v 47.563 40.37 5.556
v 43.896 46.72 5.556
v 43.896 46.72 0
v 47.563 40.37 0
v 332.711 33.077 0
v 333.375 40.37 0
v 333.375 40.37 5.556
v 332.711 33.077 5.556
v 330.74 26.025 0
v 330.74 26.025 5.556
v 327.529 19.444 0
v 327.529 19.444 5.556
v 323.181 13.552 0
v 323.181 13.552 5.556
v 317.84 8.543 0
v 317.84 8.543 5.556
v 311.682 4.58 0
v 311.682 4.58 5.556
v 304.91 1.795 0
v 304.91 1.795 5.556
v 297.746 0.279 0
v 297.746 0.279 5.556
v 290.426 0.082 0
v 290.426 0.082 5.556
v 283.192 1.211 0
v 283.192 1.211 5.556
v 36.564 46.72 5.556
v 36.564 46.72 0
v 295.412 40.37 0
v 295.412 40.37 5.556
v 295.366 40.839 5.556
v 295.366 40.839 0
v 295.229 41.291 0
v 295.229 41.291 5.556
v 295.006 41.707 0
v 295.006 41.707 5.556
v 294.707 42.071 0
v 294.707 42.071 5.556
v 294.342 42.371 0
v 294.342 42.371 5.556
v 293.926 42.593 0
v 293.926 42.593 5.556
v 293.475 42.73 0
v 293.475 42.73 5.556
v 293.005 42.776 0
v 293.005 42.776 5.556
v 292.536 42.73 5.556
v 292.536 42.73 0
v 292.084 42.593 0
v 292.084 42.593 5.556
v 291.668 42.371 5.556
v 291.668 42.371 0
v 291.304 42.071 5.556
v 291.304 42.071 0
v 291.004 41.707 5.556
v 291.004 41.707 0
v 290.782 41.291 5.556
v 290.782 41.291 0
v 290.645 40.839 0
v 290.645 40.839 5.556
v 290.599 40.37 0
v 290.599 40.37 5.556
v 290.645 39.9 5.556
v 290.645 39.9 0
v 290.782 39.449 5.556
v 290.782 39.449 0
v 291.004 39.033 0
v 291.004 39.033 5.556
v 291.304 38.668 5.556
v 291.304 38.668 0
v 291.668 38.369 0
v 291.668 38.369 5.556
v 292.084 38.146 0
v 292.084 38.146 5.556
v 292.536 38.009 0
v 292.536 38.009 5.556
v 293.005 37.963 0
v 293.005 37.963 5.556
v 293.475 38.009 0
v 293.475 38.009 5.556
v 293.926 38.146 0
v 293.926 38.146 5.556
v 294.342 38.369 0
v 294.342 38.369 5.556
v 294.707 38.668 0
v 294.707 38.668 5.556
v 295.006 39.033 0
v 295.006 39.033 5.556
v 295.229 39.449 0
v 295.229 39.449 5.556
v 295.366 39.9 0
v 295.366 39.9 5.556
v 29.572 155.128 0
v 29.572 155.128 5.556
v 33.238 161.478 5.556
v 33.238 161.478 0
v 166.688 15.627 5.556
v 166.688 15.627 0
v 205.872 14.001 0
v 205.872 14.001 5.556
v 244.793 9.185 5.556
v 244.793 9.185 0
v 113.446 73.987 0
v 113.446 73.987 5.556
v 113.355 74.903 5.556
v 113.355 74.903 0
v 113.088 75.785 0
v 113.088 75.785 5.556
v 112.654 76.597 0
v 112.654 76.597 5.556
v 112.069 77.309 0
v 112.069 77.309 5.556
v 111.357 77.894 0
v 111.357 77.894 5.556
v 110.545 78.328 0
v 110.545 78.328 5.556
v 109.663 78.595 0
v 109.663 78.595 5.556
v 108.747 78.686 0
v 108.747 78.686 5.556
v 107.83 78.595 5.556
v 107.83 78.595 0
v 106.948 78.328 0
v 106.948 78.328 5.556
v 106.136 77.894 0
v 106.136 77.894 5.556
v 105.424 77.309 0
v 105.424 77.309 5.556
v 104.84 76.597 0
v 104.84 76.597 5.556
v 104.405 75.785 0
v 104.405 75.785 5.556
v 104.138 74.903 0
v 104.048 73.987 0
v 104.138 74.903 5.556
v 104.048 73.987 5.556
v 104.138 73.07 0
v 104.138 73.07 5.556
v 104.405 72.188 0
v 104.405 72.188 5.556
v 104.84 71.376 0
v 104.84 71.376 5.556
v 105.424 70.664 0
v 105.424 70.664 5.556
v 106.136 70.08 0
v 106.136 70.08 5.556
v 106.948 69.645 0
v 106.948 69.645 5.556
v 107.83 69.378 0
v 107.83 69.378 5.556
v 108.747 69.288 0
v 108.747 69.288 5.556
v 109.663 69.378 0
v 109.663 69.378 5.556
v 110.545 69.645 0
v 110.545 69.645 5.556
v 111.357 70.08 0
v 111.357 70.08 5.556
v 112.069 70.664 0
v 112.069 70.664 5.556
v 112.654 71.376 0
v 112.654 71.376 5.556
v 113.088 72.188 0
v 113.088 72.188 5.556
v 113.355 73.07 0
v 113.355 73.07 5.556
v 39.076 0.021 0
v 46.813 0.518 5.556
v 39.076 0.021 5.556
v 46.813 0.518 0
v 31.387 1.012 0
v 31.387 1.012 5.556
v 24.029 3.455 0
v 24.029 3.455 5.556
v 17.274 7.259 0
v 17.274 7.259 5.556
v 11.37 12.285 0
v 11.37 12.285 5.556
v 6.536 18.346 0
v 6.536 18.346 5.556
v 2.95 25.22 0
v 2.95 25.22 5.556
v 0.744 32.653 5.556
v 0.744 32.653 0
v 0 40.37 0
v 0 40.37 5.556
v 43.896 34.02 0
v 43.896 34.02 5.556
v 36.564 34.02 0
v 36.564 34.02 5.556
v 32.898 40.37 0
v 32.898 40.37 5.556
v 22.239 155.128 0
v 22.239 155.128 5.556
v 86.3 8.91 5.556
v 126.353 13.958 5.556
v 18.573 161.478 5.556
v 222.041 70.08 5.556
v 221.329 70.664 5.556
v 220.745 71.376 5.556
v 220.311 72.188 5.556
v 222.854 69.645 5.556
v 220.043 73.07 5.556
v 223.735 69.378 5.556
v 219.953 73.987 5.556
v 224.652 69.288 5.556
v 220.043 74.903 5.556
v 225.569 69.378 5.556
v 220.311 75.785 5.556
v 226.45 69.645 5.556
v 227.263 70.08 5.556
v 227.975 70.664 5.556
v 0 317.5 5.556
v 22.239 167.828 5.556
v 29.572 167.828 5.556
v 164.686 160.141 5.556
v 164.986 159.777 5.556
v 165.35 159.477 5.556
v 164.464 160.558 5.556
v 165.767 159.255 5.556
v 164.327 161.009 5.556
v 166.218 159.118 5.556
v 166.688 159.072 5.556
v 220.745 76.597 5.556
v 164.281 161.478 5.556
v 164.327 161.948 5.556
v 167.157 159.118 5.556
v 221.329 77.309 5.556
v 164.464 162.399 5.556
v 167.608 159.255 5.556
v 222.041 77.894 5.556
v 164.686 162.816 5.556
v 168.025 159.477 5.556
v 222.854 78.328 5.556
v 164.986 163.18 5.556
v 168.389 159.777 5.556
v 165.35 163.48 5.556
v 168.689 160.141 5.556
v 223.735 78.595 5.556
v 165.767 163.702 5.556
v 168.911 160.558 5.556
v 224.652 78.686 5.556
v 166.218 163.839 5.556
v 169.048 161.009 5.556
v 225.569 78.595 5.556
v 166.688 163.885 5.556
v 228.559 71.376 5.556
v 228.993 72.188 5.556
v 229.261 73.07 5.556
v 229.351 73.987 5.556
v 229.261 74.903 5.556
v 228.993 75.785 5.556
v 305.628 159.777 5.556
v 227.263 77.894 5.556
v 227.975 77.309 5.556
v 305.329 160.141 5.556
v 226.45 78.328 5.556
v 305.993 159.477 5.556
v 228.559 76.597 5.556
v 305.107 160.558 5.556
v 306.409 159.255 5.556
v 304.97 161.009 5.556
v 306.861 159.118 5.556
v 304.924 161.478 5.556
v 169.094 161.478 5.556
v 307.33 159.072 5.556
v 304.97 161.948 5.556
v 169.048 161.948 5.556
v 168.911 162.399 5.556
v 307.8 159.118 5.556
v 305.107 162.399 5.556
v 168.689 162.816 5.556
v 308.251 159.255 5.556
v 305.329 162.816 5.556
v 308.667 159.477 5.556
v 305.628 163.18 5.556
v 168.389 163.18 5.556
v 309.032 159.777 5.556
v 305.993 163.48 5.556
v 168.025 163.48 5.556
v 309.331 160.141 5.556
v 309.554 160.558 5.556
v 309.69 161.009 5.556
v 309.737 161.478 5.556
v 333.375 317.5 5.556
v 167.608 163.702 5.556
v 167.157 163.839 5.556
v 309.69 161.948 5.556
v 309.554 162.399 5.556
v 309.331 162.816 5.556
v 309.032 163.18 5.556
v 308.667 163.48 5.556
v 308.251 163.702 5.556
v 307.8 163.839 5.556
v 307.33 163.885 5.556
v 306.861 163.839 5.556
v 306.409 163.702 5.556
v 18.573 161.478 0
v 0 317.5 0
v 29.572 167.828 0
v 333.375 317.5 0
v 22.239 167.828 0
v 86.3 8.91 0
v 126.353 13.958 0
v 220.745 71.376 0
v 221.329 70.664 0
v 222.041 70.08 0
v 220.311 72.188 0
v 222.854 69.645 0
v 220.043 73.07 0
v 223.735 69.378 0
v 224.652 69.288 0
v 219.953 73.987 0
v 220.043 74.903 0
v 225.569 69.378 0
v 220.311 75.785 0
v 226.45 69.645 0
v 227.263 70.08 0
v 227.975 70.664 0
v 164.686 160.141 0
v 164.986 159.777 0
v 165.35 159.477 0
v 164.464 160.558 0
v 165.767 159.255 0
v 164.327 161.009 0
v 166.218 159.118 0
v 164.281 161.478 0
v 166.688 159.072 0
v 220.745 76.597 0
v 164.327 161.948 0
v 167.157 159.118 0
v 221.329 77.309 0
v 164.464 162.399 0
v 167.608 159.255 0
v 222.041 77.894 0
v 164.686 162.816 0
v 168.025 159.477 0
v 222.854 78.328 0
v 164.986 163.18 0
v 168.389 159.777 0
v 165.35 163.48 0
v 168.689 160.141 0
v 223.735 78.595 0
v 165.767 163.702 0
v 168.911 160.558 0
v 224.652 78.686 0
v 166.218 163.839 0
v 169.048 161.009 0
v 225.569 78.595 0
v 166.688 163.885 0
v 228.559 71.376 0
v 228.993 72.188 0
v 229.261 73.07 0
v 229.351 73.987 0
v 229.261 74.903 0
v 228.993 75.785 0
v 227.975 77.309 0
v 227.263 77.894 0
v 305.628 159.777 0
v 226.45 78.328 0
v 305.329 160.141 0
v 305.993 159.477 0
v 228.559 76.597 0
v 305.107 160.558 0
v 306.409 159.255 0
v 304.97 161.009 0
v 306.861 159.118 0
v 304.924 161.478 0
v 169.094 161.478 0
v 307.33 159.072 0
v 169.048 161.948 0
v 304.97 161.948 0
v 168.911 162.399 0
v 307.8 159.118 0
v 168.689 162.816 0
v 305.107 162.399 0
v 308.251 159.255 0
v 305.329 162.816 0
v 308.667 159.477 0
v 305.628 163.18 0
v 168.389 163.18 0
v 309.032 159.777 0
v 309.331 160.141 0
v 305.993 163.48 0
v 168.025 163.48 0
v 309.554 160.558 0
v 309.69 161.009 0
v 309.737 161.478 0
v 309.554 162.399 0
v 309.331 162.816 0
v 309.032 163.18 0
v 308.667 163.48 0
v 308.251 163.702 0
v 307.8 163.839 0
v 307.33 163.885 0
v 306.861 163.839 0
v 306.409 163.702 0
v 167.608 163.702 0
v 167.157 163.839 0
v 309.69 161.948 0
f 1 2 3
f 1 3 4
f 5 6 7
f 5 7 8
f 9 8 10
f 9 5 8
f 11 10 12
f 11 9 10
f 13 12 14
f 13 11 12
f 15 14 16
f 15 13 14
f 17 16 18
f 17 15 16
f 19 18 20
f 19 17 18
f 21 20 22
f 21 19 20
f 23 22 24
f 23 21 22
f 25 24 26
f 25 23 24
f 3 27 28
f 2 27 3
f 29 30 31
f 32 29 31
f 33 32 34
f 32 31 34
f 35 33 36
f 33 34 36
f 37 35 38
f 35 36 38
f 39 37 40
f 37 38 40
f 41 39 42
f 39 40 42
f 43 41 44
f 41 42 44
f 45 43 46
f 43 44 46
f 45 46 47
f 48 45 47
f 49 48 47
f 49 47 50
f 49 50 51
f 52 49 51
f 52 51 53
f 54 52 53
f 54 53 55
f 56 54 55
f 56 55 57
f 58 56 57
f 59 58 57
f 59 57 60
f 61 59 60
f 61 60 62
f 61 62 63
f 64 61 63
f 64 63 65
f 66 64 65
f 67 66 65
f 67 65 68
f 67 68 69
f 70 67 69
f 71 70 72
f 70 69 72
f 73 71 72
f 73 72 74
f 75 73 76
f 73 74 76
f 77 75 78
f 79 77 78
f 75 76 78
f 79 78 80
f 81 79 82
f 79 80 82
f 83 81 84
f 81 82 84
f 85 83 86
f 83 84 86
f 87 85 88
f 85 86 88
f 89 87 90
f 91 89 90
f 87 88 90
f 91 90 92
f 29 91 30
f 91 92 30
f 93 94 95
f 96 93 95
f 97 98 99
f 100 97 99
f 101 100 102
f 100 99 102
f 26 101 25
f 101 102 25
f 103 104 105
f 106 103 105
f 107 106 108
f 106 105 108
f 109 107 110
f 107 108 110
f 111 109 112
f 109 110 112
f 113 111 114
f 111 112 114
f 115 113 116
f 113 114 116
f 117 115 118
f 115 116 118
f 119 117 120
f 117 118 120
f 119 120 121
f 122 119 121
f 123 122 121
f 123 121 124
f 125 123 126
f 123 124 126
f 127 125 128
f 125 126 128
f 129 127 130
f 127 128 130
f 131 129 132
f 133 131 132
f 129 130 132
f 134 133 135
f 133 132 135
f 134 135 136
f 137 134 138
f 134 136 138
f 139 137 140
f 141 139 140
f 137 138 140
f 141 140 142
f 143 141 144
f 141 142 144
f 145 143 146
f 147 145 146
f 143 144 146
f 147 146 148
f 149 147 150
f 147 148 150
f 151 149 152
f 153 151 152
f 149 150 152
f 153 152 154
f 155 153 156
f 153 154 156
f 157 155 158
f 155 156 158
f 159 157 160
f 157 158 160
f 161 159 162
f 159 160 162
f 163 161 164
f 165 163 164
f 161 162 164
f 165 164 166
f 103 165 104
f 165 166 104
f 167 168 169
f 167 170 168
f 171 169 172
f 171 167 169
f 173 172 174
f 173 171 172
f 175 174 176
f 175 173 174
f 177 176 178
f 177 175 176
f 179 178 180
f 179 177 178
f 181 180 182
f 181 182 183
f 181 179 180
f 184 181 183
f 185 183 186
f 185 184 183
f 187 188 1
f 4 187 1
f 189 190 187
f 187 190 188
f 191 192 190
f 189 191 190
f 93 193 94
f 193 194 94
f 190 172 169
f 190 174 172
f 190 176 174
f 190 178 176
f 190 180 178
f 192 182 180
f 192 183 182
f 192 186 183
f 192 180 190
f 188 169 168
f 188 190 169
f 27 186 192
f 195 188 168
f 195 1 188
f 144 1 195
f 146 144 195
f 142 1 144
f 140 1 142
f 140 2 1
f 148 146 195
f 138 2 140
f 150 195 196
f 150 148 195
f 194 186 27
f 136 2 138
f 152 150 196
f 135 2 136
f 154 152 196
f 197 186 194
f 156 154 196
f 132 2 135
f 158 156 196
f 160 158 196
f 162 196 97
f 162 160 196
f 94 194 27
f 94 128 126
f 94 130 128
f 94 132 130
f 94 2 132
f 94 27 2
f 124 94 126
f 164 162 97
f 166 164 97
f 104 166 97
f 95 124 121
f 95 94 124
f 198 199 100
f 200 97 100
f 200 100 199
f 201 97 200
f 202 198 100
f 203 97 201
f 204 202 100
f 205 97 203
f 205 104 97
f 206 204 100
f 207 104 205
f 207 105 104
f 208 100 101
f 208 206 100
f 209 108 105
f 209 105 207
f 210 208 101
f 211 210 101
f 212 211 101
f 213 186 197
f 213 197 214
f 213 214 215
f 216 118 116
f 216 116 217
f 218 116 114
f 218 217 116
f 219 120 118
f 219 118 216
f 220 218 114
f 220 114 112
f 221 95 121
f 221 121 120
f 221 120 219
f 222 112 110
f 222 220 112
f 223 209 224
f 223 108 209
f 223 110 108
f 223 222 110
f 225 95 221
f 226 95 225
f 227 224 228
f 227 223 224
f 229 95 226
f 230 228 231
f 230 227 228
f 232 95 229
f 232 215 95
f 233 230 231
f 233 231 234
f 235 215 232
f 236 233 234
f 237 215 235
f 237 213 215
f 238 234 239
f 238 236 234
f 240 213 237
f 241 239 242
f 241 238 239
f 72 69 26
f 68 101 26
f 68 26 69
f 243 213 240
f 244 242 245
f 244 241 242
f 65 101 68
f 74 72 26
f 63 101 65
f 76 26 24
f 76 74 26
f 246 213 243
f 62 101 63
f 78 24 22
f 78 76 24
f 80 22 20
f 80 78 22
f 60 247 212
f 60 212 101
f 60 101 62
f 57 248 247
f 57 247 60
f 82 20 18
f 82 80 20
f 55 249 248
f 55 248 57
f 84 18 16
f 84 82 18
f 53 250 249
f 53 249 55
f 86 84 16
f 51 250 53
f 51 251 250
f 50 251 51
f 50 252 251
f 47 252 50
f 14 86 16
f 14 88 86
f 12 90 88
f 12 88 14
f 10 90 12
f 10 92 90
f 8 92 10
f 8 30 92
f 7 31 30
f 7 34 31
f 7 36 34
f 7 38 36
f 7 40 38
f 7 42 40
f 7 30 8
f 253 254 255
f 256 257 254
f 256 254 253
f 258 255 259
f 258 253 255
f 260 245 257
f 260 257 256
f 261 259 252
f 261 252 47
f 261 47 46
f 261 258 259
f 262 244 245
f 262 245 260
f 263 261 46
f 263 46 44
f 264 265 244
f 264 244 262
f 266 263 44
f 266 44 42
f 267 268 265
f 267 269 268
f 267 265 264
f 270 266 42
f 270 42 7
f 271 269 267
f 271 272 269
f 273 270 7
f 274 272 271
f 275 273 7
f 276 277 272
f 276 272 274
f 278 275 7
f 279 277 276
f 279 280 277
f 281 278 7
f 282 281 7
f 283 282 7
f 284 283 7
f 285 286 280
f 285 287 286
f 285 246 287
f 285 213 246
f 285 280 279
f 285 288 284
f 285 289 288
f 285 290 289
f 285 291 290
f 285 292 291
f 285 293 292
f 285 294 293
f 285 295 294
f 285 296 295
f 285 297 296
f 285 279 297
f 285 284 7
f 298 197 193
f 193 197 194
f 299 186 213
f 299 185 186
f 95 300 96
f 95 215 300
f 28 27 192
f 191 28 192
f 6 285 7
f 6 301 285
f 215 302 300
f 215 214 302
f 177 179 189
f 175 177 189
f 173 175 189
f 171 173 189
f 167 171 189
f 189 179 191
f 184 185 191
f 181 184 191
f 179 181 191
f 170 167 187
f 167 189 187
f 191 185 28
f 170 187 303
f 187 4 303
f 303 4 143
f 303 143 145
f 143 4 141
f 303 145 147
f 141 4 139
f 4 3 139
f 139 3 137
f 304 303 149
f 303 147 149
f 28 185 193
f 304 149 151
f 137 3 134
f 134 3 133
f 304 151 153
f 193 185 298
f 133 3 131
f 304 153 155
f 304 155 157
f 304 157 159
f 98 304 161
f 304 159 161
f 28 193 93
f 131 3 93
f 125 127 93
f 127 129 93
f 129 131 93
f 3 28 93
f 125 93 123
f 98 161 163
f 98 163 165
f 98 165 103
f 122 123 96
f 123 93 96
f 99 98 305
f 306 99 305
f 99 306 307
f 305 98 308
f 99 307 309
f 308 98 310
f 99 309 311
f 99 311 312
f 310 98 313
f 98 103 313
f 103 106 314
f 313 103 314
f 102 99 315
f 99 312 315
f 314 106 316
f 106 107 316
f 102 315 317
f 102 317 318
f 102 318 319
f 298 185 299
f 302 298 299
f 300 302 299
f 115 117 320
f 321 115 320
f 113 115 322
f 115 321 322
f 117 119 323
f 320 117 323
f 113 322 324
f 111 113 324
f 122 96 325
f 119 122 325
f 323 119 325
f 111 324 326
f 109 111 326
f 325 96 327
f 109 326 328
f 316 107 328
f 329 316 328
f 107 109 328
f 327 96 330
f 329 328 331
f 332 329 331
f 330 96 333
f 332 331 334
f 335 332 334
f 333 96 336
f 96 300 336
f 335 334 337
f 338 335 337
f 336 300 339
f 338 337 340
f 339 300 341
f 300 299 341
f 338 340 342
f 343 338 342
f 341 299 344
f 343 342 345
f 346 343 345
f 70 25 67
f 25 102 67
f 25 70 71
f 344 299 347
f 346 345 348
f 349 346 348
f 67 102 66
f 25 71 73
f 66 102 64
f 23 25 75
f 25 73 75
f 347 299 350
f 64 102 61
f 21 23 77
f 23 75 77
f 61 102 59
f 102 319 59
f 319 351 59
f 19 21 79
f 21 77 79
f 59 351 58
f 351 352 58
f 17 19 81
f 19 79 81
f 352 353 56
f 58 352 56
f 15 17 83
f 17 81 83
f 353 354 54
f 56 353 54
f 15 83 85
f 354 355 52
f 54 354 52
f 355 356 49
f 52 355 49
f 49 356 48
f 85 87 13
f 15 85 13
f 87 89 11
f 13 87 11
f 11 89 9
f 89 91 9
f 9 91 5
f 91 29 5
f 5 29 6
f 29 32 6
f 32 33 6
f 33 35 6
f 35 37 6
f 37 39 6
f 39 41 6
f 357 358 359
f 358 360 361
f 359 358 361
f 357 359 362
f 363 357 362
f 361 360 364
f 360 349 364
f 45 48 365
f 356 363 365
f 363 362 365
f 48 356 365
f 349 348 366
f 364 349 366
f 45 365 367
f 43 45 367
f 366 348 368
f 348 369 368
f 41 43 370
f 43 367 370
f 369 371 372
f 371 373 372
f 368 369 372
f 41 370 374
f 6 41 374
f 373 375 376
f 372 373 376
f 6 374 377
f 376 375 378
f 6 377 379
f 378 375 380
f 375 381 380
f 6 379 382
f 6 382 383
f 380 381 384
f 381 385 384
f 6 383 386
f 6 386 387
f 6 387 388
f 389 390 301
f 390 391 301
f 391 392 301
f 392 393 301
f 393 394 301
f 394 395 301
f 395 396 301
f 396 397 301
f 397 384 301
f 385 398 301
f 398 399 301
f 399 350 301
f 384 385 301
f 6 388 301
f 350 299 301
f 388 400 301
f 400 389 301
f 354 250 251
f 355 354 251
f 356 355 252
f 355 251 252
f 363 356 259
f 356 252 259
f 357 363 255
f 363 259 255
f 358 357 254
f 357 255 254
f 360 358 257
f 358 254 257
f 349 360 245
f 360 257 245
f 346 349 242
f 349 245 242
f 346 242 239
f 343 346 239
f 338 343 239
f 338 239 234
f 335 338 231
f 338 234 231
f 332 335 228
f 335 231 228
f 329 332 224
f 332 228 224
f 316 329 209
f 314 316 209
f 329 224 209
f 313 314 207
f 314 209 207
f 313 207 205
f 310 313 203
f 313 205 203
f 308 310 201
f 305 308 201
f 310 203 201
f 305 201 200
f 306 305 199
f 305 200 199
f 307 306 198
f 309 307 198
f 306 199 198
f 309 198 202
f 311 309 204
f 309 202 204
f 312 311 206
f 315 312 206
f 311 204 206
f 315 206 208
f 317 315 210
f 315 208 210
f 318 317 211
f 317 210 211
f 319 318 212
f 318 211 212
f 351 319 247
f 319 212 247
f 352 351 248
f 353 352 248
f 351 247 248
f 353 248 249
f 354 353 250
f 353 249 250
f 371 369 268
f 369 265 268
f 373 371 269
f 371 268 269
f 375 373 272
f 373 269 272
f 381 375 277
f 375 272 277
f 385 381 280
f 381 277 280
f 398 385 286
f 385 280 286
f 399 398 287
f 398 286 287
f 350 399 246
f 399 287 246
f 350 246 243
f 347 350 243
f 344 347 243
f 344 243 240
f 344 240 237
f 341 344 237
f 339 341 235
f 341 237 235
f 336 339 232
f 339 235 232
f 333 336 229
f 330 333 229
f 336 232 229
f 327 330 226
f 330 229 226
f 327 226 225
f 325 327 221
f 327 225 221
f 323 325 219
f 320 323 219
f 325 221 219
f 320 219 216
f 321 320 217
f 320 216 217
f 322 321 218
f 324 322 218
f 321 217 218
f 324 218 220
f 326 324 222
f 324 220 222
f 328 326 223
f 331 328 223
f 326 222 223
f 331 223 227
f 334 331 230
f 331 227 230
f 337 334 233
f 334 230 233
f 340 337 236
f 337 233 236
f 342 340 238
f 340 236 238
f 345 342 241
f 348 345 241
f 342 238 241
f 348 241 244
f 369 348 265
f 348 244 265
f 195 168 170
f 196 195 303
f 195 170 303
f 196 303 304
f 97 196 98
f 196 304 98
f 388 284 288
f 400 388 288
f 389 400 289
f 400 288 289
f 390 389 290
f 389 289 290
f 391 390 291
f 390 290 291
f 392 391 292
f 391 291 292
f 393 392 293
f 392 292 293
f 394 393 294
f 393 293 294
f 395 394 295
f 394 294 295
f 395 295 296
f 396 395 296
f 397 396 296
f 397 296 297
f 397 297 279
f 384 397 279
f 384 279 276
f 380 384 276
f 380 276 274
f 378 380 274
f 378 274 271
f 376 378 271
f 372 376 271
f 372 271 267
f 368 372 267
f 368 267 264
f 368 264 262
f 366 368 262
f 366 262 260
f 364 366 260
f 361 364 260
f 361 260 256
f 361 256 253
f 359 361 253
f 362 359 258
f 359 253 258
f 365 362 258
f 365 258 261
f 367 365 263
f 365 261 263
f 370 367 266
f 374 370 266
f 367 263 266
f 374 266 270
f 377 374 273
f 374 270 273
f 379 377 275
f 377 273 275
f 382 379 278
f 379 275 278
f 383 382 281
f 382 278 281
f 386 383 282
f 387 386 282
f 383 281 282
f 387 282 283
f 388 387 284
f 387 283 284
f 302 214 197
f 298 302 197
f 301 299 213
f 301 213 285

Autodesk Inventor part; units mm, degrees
ref_plane "YZ Plane" through (0, 0, 0) normal (1, 0, 0) x (0, 1, 0)
ref_plane "XZ Plane" through (0, 0, 0) normal (0, 1, 0) x (-1, 0, 0)
ref_plane "XY Plane" through (0, 0, 0) normal (0, 0, 1) x (1, 0, 0)
sketch "Sketch1" plane through (0, 0, 0) normal (0, 0, 1) x (1, 0, 0)
  line L0 (40.3696, 0) -> (44.816, 0)
  line L1 (293.0054, 0) -> (287.9217, 0)
  arc A0 (0, 40.3696) -> (53.3921, 2.1581) centre (40.3696, 40.3696) ccw
  arc A1 (283.1915, 1.211) -> (333.375, 40.3696) centre (293.0054, 40.3696) ccw
  arc A2 (166.6875, 15.627) -> (44.816, 0) centre (166.3688, -464.9274) ccw
  arc A3 (287.9217, 0) -> (283.1915, 1.211) centre (166.3688, -464.9274) ccw
  arc A4 (53.3921, 2.1581) -> (44.816, 0) centre (166.3688, -464.9274) ccw
  arc A5 (287.9217, 0) -> (166.6875, 15.627) centre (166.3688, -464.9274) ccw
  line L2 (0, 40.3696) -> (0, 317.5)
  line L3 (333.375, 317.5) -> (333.375, 40.3696)
  line L4 (0, 317.5) -> (333.375, 317.5)
  line L5 (40.3696, 0) -> (293.0054, 0)
  point P0 (0, 0)
  point P1 (46.8129, 0.5175)
  dimension "d158" = 333.375
  dimension "d173" = 317.5
extrude "Extrusion1" add sketch "Sketch1" along normal blind 5.5563 contours A0 L2 L4 L3 A1 A5 A2
sketch "Sketch2" plane through (0, 0, 5.5563) normal (0, 0, 1) x (1, 0, 0)
  line L0 (43.8965, 34.0196) -> (47.5626, 40.3696)
  line L1 (43.8965, 46.7196) -> (47.5626, 40.3696)
  line L2 (36.5641, 46.7196) -> (43.8965, 46.7196)
  line L3 (36.5641, 34.0196) -> (43.8965, 34.0196)
  line L4 (36.5641, 46.7196) -> (32.898, 40.3696)
  line L5 (32.898, 40.3696) -> (36.5641, 34.0196)
  circle A0 centre (40.3696, 40.3696) radius 2.9337
  circle A1 centre (26.0449, 161.4785) radius 2.4066
  line L6 (0, 187.5234) -> (0, 40.3696)
  circle A2 centre (166.6875, 161.4785) radius 2.4066
  line L7 (333.375, 187.5234) -> (0, 187.5234)
  circle A3 centre (293.0054, 40.3696) radius 2.4066
  arc A4 (283.1915, 1.211) -> (333.375, 40.3696) centre (293.0054, 40.3696) ccw
  circle A5 centre (307.3301, 161.4785) radius 2.4066
  line L8 (333.375, 40.3696) -> (333.375, 187.5234)
  circle A6 centre (40.3696, 40.3696) radius 2.4066
  arc A7 (0, 40.3696) -> (46.8129, 0.5175) centre (40.3696, 40.3696) ccw
  line L9 (22.2394, 167.8285) -> (18.5732, 161.4785)
  line L10 (18.5732, 161.4785) -> (22.2394, 155.1285)
  line L11 (22.2394, 167.8285) -> (29.5718, 167.8285)
  line L12 (22.2394, 155.1285) -> (29.5718, 155.1285)
  line L13 (29.5718, 155.1285) -> (33.2379, 161.4785)
  line L14 (29.5718, 167.8285) -> (33.2379, 161.4785)
  circle A8 centre (26.0449, 161.4785) radius 2.9337
  point P0 (333.375, 40.3696)
  point P1 (283.1915, 1.211)
  point P2 (365.2681, 51.0131)
  point P3 (0, 0)
  point P4 (0, 0)
  dimension "d102" = 12.7
  dimension "d103" = 12.7
  dimension "d104" = 12.7
  dimension "d105" = 7.3323
  dimension "d106" = 7.3323
  dimension "d107" = 7.3323
  dimension "d108" = 7.3323
  dimension "d109" = 7.3323
  dimension "d110" = 7.3323
  dimension "d145" = 5.8674
  dimension "d160" = 333.375
  dimension "d161" = 12.7
  dimension "d162" = 12.7
  dimension "d163" = 12.7
  dimension "d164" = 7.3323
  dimension "d165" = 7.3323
  dimension "d166" = 7.3323
  dimension "d167" = 7.3323
  dimension "d168" = 7.3323
  dimension "d169" = 7.3323
  dimension "d170" = 5.8674
extrude "Extrusion2" cut sketch "Sketch2" against normal through all contours L3 L5 L4 L2 L1 L0 | A0 | A1 | A2 | A3 | A5 | A6 | L11 L14 L13 L12 L10 L9 | A8
sketch "Sketch6" plane through (0, 0, 5.5563) normal (0, 0, 1) x (1, 0, 0)
  ellipse E0 centre (224.6212, 89.9867) end of major axis (224.6174, 91.9867) minor radius 2
  ellipse E1 centre (224.6212, 57.9868) end of major axis (224.6139, 59.9867) minor radius 2
  line L0 (292.9982, 40.3696) -> (224.6212, 40.3696)
  line L1 (224.6212, 40.3696) -> (224.6212, 57.9868)
  ellipse E2 centre (108.7157, 89.9867) end of major axis (108.7119, 91.9867) minor radius 2
  ellipse E3 centre (108.7466, 57.9868) end of major axis (108.7392, 59.9867) minor radius 2
  line L2 (108.7466, 40.2597) -> (108.7466, 57.8769)
  circle A0 centre (224.6521, 73.9867) radius 4.699
  circle A1 centre (108.7466, 73.9867) radius 4.699
  line L3 (40.3696, 40.2597) -> (108.7466, 40.2597)
  circle A2 centre (293.0054, 40.3696) radius 2.4066 projected
  point P0 (0, 0)
  dimension "d147" = 17.6171
  dimension "d150" = 17.6171
  dimension "d152" = 9.398
  dimension "d153" = 9.398
  dimension "d171" = 31.9999
  dimension "d172" = 31.9999
extrude "Extrusion7" cut sketch "Sketch6" against normal through all contours A0 | A1
properties part number "FTC Outside Panels" material "Wood (Oak)"
